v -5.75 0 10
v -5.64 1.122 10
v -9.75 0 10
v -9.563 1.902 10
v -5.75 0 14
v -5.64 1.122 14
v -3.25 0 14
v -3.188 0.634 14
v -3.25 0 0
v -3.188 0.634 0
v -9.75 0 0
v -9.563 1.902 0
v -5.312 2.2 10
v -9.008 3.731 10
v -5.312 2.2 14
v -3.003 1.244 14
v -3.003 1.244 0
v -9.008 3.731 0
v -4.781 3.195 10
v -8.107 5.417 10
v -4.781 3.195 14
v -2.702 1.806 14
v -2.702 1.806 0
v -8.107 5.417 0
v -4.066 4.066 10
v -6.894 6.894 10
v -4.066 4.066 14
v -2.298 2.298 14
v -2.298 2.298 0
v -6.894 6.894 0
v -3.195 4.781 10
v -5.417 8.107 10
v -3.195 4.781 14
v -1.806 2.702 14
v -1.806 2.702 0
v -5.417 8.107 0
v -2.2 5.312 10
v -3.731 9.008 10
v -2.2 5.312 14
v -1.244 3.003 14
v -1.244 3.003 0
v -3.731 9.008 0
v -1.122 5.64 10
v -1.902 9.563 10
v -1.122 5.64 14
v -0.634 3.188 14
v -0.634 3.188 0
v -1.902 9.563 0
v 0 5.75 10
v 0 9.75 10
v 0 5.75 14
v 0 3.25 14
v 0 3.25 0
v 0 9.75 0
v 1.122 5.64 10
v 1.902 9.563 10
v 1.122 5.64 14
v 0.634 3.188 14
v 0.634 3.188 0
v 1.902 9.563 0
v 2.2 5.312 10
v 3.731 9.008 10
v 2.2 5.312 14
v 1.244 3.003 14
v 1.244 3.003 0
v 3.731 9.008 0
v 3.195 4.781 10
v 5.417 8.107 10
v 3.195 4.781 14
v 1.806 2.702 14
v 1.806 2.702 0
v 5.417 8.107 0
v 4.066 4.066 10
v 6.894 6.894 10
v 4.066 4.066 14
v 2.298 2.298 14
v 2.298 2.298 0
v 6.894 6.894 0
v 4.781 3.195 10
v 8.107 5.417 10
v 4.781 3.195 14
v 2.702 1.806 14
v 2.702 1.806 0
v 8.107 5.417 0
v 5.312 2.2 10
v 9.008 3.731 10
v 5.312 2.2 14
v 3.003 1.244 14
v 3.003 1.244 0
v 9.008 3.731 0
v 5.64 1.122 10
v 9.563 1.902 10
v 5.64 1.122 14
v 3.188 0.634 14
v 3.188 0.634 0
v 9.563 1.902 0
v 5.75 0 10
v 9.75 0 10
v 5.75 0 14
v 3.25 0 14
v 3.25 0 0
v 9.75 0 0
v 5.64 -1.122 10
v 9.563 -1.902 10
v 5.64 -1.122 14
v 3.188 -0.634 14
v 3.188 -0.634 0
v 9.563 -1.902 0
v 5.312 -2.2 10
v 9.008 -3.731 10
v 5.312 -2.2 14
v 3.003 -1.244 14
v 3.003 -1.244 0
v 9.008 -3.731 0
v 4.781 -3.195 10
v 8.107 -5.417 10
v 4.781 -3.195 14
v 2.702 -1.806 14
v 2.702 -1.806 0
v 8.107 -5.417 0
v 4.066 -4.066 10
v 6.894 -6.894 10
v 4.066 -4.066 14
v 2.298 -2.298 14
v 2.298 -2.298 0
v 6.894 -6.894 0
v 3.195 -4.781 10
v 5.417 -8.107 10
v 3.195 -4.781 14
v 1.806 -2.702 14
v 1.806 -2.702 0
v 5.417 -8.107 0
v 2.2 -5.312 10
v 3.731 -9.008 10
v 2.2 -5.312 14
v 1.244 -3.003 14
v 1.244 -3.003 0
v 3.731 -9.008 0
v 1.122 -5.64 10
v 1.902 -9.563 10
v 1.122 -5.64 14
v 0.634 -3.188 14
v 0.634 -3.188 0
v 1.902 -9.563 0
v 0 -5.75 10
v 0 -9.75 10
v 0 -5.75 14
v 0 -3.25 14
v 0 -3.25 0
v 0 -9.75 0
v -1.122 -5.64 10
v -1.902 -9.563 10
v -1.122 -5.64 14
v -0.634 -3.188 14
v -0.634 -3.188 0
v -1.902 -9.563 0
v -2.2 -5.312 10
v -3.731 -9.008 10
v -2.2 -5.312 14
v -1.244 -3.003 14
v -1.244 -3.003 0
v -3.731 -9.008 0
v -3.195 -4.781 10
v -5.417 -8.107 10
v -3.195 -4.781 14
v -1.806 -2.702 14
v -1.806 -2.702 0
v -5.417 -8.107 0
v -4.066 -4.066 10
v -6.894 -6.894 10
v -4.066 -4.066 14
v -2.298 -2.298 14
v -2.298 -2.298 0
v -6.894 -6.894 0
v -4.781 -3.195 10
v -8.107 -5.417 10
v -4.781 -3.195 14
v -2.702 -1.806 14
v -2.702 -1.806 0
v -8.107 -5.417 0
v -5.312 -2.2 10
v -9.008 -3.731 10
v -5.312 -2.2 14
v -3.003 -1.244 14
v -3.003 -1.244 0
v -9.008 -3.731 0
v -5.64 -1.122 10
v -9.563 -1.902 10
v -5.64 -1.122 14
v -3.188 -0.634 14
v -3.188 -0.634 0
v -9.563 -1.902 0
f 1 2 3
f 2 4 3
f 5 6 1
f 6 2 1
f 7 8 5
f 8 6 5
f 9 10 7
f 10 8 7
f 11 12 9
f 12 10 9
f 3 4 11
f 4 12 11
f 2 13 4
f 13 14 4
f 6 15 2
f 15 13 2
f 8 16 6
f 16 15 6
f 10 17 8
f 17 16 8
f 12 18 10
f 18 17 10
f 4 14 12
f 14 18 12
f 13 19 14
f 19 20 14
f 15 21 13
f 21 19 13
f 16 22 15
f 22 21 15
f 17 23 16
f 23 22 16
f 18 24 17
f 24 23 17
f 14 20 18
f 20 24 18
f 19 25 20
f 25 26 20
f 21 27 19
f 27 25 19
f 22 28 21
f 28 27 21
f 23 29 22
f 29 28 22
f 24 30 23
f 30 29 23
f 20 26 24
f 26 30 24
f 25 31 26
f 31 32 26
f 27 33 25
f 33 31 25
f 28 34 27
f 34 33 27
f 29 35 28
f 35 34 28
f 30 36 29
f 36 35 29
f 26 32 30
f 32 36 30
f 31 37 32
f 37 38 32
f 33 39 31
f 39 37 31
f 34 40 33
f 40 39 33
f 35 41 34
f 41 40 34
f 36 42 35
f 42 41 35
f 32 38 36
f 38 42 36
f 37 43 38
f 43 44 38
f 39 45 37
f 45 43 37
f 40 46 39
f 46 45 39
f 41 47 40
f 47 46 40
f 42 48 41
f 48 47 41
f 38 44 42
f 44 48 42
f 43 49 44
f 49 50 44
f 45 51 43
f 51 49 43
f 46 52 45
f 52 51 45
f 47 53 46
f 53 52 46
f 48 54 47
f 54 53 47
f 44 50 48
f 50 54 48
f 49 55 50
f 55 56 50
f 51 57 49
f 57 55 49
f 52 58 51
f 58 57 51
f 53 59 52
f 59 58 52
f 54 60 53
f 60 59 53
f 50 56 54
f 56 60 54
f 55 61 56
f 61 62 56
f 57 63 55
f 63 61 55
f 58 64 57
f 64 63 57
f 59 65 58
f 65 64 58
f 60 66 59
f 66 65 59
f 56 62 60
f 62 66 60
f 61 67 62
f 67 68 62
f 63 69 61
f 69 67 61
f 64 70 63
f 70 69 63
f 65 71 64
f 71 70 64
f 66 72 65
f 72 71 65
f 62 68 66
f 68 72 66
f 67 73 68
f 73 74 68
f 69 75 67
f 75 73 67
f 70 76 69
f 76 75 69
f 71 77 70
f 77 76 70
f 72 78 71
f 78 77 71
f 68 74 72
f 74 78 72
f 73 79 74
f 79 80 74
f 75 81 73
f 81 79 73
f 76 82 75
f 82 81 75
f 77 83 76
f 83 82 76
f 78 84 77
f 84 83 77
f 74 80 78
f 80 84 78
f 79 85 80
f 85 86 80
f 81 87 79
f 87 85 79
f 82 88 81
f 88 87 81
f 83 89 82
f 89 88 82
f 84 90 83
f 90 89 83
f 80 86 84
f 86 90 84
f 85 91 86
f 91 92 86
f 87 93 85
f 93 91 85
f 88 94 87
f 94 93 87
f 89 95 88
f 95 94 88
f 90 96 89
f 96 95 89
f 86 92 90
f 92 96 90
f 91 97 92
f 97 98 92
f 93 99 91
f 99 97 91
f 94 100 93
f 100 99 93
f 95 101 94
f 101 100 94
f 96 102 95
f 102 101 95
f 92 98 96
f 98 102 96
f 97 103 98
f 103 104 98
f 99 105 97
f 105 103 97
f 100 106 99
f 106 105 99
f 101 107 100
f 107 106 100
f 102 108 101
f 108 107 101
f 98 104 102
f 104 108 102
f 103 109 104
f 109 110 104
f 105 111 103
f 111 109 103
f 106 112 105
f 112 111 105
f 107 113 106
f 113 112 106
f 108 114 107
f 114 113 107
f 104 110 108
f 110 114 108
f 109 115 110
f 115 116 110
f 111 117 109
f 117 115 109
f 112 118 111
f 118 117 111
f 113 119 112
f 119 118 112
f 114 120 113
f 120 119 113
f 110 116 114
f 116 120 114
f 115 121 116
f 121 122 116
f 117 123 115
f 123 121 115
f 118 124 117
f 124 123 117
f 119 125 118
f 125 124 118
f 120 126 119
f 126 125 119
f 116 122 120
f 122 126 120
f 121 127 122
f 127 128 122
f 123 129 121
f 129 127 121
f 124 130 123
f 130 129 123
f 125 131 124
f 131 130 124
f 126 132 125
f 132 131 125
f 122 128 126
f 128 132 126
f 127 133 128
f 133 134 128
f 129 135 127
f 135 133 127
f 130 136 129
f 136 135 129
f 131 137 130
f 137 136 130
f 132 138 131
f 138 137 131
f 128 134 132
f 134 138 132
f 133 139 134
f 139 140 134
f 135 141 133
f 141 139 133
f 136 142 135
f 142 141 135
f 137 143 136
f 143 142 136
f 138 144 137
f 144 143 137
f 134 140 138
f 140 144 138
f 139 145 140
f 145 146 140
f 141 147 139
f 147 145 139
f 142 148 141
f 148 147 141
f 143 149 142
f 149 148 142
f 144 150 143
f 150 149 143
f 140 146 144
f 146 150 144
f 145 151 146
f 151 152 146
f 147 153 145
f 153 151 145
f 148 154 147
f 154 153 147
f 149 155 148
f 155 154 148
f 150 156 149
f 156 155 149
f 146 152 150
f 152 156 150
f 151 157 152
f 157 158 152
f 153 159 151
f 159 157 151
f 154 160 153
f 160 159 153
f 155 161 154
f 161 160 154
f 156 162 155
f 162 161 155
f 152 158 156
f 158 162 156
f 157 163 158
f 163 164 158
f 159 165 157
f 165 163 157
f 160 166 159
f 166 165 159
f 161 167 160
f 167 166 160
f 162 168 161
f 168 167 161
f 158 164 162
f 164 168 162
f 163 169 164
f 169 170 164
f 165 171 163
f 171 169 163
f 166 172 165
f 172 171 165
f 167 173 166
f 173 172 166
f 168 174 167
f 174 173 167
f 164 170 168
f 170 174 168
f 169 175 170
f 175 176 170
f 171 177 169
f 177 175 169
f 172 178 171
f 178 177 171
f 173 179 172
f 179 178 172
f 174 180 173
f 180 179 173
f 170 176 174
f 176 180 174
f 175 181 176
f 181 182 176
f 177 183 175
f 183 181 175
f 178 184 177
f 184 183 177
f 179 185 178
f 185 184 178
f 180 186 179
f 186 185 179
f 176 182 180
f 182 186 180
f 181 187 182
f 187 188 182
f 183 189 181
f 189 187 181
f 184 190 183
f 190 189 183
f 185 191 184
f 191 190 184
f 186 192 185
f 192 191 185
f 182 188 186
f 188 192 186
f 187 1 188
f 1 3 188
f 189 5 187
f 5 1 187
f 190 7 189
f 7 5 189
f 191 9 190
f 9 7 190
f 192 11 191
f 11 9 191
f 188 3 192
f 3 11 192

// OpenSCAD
$fn = 32;

// ----------------------------------------------------------------------
// Form washer: stepped_c washer, 19.5 mm outside, 6.5 mm bore
// ----------------------------------------------------------------------

// --- parameters (mm) ---
revolve_angle = 360;      // full turn around the Z axis
profile_points = 6;       // points of the closed outline

profile = [[3.25, 0], [9.75, 0], [9.75, 10], [5.75, 10], [5.75, 14], [3.25, 14]];  // single closed polygon, 6 points, counter clockwise

// --- the one profile operation ---
rotate_extrude(angle = revolve_angle) polygon(points = profile);
